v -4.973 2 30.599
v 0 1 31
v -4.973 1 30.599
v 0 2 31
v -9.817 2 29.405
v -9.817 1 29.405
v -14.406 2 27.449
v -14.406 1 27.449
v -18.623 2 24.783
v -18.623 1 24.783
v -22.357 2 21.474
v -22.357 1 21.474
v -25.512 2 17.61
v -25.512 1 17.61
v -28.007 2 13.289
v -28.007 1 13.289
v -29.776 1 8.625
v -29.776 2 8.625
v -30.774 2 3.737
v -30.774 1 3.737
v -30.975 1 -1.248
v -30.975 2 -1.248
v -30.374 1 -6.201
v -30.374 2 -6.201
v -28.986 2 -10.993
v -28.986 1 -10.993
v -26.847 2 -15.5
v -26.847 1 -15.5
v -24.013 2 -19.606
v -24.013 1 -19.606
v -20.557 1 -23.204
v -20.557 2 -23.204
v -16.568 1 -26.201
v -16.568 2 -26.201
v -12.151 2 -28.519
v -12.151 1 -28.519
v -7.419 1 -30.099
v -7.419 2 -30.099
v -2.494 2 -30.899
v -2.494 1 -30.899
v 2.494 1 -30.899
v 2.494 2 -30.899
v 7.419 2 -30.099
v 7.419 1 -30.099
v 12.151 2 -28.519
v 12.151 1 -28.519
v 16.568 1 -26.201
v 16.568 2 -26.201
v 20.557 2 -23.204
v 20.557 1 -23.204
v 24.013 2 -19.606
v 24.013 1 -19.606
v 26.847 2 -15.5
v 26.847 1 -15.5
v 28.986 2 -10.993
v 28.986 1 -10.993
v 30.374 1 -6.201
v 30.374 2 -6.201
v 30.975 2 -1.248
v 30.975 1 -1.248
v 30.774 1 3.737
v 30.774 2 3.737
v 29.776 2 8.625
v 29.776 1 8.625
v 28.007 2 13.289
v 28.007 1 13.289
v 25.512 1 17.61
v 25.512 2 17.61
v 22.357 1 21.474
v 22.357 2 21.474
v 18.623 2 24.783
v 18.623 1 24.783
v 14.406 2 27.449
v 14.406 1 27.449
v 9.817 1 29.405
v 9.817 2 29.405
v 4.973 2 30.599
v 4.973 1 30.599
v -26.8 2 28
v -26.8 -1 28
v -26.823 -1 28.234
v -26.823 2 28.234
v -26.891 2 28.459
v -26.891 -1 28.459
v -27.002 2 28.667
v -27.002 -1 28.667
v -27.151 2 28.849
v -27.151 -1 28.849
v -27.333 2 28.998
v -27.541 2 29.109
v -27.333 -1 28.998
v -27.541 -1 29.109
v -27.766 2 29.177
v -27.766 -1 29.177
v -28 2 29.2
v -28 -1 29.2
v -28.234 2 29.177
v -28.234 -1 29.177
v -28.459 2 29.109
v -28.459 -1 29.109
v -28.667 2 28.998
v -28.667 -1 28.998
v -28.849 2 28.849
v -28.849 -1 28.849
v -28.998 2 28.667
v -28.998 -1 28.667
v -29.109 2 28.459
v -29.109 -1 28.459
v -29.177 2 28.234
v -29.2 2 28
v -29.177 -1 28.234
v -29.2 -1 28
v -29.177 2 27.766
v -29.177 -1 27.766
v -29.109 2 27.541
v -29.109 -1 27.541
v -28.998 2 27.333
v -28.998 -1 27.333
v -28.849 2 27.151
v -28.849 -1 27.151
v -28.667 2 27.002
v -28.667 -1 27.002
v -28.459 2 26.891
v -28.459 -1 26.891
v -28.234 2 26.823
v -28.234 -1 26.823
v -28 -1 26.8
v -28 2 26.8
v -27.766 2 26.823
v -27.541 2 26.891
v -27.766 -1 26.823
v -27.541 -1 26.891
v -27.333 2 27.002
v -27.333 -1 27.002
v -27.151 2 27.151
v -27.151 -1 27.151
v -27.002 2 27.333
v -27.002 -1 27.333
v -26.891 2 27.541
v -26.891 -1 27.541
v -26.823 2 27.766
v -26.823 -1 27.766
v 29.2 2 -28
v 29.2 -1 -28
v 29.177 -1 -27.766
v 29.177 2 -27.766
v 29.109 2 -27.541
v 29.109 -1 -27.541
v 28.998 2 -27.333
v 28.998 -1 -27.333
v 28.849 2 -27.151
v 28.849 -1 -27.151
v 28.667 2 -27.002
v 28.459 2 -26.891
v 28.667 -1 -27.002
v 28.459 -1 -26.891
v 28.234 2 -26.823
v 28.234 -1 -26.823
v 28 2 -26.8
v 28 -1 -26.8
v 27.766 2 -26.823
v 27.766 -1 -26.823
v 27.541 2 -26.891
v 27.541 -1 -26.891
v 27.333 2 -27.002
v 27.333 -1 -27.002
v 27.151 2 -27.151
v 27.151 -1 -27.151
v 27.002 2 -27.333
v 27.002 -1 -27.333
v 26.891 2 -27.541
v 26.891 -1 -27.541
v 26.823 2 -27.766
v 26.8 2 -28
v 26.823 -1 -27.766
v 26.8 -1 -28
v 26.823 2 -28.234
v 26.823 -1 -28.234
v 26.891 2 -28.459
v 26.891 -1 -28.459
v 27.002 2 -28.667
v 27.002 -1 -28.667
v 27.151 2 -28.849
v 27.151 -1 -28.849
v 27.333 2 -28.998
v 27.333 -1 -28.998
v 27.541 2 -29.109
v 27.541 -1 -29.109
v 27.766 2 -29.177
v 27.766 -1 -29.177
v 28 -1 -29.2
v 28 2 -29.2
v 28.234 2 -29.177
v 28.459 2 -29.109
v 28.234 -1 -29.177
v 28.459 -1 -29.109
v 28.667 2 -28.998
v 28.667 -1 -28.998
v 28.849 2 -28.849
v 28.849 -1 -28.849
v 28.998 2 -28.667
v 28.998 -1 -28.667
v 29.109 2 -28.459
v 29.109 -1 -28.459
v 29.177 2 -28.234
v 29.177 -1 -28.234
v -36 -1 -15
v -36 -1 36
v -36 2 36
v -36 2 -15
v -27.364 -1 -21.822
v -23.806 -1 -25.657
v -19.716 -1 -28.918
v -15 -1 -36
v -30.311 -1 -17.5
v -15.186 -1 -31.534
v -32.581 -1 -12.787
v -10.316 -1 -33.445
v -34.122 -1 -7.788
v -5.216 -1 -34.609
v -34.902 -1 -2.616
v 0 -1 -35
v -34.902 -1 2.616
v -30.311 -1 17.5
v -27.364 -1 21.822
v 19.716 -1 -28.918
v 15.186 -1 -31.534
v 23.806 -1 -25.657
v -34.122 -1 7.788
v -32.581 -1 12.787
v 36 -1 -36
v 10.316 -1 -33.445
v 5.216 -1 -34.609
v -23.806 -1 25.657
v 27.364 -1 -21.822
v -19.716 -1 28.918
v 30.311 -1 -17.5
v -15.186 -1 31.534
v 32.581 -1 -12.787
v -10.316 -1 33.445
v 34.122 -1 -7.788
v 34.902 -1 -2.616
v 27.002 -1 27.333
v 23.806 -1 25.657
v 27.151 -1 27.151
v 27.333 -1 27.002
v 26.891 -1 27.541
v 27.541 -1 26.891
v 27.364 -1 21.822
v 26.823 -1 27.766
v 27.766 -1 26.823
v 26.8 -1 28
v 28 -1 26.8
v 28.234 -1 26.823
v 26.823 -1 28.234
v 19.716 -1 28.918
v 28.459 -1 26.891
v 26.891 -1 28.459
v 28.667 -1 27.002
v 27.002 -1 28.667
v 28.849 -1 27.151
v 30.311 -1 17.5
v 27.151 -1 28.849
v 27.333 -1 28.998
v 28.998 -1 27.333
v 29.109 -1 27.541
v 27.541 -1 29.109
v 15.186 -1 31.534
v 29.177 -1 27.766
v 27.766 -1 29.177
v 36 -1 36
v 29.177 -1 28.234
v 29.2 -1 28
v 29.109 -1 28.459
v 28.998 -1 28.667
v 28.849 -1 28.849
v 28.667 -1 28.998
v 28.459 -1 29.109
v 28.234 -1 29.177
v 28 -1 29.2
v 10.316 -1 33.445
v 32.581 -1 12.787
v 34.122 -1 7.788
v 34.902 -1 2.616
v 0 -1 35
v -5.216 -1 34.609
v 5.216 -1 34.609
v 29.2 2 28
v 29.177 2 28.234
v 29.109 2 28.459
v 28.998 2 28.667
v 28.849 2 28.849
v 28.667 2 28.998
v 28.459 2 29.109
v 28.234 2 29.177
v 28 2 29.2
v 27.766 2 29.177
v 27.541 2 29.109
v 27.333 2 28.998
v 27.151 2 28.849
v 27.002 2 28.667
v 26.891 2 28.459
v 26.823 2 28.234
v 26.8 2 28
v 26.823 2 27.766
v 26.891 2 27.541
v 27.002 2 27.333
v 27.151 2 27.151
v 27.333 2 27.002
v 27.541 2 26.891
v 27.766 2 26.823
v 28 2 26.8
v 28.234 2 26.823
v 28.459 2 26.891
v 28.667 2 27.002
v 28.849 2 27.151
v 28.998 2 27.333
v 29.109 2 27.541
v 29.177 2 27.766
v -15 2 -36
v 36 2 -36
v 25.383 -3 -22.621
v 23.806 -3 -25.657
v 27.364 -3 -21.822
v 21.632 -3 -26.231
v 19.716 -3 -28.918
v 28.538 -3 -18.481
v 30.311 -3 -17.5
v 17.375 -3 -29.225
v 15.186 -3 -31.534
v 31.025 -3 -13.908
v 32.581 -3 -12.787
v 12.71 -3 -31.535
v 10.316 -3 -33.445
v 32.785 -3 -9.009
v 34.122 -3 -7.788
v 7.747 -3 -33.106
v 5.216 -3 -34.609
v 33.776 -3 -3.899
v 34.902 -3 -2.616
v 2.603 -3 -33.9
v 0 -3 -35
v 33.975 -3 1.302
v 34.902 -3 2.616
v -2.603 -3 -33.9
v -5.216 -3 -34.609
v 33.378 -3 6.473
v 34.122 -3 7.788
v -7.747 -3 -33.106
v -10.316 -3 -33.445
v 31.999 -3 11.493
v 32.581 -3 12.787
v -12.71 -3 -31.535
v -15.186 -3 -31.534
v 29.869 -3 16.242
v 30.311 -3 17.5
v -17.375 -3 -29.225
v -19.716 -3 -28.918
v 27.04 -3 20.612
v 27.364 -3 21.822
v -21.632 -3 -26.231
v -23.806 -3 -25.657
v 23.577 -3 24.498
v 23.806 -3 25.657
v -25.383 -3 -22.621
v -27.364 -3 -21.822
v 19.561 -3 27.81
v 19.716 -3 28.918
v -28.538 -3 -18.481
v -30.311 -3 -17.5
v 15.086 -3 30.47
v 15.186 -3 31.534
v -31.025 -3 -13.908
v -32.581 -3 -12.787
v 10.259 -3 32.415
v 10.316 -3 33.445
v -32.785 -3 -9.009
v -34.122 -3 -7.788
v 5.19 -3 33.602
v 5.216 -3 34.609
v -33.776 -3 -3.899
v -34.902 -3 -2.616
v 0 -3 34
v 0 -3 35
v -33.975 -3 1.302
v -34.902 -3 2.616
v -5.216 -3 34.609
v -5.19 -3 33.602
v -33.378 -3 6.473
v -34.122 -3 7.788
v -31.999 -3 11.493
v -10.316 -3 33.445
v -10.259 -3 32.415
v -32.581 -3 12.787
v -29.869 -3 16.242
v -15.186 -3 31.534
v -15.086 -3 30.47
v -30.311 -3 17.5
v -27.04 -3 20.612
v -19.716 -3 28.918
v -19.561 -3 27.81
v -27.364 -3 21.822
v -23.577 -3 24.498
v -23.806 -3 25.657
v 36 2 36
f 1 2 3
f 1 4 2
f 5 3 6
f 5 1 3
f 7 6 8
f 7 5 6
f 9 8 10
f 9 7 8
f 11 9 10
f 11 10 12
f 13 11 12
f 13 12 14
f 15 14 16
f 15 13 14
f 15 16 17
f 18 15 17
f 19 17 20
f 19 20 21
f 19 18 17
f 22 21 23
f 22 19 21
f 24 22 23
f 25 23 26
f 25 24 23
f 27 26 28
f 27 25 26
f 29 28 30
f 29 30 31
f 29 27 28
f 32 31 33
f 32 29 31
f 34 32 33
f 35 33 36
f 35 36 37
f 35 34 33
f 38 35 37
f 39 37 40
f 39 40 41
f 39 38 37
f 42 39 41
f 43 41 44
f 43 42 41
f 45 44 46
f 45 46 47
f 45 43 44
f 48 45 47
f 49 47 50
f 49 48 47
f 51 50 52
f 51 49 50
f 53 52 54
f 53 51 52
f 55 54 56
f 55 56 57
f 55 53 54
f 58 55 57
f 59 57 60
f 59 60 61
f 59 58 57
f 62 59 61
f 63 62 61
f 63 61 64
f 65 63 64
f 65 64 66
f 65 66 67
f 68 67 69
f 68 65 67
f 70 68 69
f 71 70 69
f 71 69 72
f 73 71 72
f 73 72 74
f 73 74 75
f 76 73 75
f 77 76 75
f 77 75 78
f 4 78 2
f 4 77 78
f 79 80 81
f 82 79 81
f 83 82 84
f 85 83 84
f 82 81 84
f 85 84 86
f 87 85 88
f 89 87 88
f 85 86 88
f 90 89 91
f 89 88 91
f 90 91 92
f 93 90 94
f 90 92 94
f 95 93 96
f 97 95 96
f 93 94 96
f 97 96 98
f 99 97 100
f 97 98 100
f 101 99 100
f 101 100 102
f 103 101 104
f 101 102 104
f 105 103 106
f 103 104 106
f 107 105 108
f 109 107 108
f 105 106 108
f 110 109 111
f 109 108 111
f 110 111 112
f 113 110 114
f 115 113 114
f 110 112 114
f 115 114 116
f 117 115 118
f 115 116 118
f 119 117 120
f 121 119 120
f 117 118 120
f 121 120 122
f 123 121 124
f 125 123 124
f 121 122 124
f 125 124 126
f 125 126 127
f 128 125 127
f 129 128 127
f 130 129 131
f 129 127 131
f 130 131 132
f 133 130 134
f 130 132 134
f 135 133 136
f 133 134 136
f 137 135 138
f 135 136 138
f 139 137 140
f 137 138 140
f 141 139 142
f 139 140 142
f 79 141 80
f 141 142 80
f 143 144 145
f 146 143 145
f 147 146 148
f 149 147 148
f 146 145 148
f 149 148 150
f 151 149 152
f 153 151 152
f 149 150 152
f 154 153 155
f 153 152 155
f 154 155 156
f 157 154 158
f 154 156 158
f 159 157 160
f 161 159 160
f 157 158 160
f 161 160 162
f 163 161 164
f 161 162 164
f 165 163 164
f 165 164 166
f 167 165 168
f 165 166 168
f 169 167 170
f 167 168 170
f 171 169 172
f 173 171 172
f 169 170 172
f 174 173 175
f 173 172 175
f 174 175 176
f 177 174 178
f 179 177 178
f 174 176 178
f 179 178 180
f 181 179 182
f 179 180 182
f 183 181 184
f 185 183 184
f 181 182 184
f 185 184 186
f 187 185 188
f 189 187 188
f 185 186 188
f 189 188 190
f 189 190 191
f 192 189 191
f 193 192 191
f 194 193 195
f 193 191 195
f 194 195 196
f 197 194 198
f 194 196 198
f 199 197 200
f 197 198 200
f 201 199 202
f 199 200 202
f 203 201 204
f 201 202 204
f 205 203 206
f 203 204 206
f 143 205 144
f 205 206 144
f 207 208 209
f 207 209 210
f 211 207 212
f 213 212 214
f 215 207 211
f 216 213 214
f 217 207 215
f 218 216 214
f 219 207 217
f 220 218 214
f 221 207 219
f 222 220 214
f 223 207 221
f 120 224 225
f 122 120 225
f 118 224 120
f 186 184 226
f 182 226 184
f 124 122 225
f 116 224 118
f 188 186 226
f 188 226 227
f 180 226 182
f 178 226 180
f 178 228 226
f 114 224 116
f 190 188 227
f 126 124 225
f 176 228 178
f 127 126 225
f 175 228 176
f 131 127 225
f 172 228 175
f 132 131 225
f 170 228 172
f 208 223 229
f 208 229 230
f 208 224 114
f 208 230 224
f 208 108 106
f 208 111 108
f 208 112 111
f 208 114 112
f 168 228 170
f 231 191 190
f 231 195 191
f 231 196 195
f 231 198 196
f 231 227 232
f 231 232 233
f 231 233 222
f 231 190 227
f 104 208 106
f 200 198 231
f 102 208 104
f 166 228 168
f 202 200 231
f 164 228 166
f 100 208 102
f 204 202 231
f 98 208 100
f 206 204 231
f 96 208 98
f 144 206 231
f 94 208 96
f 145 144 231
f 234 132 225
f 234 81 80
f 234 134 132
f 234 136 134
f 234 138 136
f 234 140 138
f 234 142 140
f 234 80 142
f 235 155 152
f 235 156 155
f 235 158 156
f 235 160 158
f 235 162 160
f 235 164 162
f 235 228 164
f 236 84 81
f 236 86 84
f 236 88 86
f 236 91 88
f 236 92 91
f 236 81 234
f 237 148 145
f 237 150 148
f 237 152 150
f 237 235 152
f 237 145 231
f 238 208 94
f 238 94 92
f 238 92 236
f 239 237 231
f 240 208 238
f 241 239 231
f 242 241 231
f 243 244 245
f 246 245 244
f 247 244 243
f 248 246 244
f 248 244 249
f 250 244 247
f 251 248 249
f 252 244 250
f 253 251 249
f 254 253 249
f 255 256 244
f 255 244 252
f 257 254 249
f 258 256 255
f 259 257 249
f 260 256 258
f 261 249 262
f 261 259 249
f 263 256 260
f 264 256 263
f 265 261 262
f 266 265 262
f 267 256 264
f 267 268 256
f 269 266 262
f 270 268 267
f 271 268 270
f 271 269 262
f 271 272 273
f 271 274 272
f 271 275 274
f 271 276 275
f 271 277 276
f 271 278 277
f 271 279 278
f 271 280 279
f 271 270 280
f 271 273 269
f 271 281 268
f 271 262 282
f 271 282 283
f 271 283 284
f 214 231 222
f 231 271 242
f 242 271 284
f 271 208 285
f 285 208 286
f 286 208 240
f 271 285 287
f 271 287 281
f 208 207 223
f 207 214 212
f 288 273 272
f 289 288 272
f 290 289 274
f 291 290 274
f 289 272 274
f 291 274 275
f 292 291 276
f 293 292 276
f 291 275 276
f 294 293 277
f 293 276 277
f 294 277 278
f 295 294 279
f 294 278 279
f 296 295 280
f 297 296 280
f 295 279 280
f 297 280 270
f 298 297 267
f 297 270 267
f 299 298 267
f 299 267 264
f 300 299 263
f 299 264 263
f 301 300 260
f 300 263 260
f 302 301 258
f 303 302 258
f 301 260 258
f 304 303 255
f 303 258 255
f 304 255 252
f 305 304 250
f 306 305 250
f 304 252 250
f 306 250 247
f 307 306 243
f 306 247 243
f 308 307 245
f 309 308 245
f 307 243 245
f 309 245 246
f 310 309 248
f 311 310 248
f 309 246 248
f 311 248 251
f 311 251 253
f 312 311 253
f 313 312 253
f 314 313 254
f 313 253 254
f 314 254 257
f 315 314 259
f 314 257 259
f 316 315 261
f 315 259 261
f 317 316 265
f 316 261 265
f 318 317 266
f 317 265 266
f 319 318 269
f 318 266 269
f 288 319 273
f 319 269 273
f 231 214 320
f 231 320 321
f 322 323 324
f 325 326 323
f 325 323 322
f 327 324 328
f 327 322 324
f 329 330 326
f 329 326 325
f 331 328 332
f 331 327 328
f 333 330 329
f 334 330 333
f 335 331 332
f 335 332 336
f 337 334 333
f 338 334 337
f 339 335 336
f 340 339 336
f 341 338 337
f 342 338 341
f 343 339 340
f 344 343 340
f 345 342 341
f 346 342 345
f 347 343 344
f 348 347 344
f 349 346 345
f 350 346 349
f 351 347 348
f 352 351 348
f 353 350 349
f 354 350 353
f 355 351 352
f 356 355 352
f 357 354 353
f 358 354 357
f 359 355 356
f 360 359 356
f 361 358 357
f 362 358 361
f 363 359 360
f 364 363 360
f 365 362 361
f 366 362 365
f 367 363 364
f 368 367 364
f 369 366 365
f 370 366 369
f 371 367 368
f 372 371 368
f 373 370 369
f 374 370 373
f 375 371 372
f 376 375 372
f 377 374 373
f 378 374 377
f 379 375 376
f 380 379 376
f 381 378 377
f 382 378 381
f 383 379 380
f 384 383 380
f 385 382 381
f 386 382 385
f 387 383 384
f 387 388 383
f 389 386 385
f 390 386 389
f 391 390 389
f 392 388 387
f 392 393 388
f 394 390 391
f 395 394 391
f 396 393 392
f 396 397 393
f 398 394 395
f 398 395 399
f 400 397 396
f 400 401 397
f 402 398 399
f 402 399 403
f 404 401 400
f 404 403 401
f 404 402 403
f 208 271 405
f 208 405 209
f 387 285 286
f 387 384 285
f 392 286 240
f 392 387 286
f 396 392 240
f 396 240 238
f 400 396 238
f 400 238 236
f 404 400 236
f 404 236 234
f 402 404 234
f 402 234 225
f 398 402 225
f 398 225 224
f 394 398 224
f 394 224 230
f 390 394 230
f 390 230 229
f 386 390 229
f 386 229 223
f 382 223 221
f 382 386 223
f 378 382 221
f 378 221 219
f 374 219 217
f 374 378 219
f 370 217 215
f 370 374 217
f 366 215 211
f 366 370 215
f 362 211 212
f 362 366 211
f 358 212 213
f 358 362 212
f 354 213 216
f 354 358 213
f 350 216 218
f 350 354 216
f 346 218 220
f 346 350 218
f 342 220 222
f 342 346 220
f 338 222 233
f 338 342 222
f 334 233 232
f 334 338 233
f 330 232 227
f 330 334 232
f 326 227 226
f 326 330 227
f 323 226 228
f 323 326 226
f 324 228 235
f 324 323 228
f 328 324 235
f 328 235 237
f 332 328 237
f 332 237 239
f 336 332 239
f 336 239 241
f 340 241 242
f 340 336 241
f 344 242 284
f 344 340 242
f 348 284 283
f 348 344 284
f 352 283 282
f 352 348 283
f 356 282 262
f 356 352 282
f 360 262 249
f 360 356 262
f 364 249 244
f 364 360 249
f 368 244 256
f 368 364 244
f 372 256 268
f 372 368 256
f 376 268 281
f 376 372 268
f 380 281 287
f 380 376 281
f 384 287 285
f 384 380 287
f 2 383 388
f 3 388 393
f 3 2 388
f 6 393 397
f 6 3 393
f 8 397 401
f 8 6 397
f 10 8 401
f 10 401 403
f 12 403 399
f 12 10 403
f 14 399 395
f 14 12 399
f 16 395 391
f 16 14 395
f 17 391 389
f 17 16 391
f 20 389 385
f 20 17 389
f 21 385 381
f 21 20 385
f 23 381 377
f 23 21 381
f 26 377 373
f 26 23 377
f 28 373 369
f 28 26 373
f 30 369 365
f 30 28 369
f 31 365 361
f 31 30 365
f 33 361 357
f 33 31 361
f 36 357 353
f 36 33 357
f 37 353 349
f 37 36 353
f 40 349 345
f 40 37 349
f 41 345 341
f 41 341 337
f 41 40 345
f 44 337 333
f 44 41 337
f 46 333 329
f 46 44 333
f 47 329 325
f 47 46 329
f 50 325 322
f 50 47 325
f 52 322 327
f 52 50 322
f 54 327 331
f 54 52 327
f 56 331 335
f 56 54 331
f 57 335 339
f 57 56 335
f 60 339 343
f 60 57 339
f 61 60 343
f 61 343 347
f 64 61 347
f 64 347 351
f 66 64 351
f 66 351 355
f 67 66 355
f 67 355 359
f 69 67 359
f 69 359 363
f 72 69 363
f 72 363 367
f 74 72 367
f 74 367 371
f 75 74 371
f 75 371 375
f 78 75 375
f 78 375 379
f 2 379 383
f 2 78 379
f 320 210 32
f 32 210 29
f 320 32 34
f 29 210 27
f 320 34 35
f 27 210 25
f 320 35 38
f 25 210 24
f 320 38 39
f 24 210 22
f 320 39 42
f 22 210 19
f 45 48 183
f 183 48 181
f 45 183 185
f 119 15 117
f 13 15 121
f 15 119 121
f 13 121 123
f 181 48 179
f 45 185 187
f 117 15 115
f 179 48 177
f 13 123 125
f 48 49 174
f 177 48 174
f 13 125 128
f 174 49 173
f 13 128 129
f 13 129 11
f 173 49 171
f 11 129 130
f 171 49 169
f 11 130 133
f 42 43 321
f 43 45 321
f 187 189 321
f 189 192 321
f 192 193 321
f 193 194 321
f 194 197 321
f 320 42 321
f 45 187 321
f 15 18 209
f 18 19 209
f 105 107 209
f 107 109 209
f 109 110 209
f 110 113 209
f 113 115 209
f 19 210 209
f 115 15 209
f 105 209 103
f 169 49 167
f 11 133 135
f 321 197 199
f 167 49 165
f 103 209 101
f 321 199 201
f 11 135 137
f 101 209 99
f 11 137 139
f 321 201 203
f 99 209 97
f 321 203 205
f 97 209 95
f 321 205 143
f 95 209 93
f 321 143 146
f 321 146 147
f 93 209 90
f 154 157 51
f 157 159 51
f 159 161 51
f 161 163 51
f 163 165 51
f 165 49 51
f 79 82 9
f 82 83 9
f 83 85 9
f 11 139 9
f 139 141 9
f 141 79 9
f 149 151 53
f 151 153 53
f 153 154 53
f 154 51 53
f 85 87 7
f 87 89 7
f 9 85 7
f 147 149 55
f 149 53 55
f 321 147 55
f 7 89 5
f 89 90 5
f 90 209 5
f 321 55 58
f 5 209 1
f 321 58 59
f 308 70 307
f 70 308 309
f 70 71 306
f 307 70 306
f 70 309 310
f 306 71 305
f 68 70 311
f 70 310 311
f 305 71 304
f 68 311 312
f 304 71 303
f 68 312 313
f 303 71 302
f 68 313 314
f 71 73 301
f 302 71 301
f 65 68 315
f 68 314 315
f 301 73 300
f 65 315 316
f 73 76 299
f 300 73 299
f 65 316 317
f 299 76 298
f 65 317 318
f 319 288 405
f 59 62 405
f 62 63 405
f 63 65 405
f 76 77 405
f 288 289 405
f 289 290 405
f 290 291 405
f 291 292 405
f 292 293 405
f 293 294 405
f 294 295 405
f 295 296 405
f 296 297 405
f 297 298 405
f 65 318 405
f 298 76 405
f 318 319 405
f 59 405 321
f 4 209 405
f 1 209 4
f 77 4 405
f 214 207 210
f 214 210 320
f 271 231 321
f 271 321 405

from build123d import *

# Parameters (mm, degrees)
F3_R     = 1.2
F3_R_2   = 35
F4_DEPTH = 3


with BuildPart() as f1:
    # F0 (on Right) → F1 (revolve)
    with BuildSketch(Plane.YZ):
        Polygon((2, 35), (-3, 35), (-3, 34), (1, 31), (2, 31), align=None)
    revolve(axis=Axis((0, 1.602868, 0), (0, -1, 0)))

    # F3 (on offset) → F4 (join)
    with BuildSketch(Plane.XZ.offset(1)):
        Polygon((-15, -36), (36, -36), (36, 36), (-36, 36), (-36, -15), align=None)
        with Locations((28, -28)):
            Circle(F3_R, mode=Mode.SUBTRACT)
        with Locations((-28, 28)):
            Circle(F3_R, mode=Mode.SUBTRACT)
        Circle(F3_R_2, mode=Mode.SUBTRACT)
        with Locations((28, 28)):
            Circle(F3_R, mode=Mode.SUBTRACT)
    extrude(amount=-F4_DEPTH)


solid = f1.part
